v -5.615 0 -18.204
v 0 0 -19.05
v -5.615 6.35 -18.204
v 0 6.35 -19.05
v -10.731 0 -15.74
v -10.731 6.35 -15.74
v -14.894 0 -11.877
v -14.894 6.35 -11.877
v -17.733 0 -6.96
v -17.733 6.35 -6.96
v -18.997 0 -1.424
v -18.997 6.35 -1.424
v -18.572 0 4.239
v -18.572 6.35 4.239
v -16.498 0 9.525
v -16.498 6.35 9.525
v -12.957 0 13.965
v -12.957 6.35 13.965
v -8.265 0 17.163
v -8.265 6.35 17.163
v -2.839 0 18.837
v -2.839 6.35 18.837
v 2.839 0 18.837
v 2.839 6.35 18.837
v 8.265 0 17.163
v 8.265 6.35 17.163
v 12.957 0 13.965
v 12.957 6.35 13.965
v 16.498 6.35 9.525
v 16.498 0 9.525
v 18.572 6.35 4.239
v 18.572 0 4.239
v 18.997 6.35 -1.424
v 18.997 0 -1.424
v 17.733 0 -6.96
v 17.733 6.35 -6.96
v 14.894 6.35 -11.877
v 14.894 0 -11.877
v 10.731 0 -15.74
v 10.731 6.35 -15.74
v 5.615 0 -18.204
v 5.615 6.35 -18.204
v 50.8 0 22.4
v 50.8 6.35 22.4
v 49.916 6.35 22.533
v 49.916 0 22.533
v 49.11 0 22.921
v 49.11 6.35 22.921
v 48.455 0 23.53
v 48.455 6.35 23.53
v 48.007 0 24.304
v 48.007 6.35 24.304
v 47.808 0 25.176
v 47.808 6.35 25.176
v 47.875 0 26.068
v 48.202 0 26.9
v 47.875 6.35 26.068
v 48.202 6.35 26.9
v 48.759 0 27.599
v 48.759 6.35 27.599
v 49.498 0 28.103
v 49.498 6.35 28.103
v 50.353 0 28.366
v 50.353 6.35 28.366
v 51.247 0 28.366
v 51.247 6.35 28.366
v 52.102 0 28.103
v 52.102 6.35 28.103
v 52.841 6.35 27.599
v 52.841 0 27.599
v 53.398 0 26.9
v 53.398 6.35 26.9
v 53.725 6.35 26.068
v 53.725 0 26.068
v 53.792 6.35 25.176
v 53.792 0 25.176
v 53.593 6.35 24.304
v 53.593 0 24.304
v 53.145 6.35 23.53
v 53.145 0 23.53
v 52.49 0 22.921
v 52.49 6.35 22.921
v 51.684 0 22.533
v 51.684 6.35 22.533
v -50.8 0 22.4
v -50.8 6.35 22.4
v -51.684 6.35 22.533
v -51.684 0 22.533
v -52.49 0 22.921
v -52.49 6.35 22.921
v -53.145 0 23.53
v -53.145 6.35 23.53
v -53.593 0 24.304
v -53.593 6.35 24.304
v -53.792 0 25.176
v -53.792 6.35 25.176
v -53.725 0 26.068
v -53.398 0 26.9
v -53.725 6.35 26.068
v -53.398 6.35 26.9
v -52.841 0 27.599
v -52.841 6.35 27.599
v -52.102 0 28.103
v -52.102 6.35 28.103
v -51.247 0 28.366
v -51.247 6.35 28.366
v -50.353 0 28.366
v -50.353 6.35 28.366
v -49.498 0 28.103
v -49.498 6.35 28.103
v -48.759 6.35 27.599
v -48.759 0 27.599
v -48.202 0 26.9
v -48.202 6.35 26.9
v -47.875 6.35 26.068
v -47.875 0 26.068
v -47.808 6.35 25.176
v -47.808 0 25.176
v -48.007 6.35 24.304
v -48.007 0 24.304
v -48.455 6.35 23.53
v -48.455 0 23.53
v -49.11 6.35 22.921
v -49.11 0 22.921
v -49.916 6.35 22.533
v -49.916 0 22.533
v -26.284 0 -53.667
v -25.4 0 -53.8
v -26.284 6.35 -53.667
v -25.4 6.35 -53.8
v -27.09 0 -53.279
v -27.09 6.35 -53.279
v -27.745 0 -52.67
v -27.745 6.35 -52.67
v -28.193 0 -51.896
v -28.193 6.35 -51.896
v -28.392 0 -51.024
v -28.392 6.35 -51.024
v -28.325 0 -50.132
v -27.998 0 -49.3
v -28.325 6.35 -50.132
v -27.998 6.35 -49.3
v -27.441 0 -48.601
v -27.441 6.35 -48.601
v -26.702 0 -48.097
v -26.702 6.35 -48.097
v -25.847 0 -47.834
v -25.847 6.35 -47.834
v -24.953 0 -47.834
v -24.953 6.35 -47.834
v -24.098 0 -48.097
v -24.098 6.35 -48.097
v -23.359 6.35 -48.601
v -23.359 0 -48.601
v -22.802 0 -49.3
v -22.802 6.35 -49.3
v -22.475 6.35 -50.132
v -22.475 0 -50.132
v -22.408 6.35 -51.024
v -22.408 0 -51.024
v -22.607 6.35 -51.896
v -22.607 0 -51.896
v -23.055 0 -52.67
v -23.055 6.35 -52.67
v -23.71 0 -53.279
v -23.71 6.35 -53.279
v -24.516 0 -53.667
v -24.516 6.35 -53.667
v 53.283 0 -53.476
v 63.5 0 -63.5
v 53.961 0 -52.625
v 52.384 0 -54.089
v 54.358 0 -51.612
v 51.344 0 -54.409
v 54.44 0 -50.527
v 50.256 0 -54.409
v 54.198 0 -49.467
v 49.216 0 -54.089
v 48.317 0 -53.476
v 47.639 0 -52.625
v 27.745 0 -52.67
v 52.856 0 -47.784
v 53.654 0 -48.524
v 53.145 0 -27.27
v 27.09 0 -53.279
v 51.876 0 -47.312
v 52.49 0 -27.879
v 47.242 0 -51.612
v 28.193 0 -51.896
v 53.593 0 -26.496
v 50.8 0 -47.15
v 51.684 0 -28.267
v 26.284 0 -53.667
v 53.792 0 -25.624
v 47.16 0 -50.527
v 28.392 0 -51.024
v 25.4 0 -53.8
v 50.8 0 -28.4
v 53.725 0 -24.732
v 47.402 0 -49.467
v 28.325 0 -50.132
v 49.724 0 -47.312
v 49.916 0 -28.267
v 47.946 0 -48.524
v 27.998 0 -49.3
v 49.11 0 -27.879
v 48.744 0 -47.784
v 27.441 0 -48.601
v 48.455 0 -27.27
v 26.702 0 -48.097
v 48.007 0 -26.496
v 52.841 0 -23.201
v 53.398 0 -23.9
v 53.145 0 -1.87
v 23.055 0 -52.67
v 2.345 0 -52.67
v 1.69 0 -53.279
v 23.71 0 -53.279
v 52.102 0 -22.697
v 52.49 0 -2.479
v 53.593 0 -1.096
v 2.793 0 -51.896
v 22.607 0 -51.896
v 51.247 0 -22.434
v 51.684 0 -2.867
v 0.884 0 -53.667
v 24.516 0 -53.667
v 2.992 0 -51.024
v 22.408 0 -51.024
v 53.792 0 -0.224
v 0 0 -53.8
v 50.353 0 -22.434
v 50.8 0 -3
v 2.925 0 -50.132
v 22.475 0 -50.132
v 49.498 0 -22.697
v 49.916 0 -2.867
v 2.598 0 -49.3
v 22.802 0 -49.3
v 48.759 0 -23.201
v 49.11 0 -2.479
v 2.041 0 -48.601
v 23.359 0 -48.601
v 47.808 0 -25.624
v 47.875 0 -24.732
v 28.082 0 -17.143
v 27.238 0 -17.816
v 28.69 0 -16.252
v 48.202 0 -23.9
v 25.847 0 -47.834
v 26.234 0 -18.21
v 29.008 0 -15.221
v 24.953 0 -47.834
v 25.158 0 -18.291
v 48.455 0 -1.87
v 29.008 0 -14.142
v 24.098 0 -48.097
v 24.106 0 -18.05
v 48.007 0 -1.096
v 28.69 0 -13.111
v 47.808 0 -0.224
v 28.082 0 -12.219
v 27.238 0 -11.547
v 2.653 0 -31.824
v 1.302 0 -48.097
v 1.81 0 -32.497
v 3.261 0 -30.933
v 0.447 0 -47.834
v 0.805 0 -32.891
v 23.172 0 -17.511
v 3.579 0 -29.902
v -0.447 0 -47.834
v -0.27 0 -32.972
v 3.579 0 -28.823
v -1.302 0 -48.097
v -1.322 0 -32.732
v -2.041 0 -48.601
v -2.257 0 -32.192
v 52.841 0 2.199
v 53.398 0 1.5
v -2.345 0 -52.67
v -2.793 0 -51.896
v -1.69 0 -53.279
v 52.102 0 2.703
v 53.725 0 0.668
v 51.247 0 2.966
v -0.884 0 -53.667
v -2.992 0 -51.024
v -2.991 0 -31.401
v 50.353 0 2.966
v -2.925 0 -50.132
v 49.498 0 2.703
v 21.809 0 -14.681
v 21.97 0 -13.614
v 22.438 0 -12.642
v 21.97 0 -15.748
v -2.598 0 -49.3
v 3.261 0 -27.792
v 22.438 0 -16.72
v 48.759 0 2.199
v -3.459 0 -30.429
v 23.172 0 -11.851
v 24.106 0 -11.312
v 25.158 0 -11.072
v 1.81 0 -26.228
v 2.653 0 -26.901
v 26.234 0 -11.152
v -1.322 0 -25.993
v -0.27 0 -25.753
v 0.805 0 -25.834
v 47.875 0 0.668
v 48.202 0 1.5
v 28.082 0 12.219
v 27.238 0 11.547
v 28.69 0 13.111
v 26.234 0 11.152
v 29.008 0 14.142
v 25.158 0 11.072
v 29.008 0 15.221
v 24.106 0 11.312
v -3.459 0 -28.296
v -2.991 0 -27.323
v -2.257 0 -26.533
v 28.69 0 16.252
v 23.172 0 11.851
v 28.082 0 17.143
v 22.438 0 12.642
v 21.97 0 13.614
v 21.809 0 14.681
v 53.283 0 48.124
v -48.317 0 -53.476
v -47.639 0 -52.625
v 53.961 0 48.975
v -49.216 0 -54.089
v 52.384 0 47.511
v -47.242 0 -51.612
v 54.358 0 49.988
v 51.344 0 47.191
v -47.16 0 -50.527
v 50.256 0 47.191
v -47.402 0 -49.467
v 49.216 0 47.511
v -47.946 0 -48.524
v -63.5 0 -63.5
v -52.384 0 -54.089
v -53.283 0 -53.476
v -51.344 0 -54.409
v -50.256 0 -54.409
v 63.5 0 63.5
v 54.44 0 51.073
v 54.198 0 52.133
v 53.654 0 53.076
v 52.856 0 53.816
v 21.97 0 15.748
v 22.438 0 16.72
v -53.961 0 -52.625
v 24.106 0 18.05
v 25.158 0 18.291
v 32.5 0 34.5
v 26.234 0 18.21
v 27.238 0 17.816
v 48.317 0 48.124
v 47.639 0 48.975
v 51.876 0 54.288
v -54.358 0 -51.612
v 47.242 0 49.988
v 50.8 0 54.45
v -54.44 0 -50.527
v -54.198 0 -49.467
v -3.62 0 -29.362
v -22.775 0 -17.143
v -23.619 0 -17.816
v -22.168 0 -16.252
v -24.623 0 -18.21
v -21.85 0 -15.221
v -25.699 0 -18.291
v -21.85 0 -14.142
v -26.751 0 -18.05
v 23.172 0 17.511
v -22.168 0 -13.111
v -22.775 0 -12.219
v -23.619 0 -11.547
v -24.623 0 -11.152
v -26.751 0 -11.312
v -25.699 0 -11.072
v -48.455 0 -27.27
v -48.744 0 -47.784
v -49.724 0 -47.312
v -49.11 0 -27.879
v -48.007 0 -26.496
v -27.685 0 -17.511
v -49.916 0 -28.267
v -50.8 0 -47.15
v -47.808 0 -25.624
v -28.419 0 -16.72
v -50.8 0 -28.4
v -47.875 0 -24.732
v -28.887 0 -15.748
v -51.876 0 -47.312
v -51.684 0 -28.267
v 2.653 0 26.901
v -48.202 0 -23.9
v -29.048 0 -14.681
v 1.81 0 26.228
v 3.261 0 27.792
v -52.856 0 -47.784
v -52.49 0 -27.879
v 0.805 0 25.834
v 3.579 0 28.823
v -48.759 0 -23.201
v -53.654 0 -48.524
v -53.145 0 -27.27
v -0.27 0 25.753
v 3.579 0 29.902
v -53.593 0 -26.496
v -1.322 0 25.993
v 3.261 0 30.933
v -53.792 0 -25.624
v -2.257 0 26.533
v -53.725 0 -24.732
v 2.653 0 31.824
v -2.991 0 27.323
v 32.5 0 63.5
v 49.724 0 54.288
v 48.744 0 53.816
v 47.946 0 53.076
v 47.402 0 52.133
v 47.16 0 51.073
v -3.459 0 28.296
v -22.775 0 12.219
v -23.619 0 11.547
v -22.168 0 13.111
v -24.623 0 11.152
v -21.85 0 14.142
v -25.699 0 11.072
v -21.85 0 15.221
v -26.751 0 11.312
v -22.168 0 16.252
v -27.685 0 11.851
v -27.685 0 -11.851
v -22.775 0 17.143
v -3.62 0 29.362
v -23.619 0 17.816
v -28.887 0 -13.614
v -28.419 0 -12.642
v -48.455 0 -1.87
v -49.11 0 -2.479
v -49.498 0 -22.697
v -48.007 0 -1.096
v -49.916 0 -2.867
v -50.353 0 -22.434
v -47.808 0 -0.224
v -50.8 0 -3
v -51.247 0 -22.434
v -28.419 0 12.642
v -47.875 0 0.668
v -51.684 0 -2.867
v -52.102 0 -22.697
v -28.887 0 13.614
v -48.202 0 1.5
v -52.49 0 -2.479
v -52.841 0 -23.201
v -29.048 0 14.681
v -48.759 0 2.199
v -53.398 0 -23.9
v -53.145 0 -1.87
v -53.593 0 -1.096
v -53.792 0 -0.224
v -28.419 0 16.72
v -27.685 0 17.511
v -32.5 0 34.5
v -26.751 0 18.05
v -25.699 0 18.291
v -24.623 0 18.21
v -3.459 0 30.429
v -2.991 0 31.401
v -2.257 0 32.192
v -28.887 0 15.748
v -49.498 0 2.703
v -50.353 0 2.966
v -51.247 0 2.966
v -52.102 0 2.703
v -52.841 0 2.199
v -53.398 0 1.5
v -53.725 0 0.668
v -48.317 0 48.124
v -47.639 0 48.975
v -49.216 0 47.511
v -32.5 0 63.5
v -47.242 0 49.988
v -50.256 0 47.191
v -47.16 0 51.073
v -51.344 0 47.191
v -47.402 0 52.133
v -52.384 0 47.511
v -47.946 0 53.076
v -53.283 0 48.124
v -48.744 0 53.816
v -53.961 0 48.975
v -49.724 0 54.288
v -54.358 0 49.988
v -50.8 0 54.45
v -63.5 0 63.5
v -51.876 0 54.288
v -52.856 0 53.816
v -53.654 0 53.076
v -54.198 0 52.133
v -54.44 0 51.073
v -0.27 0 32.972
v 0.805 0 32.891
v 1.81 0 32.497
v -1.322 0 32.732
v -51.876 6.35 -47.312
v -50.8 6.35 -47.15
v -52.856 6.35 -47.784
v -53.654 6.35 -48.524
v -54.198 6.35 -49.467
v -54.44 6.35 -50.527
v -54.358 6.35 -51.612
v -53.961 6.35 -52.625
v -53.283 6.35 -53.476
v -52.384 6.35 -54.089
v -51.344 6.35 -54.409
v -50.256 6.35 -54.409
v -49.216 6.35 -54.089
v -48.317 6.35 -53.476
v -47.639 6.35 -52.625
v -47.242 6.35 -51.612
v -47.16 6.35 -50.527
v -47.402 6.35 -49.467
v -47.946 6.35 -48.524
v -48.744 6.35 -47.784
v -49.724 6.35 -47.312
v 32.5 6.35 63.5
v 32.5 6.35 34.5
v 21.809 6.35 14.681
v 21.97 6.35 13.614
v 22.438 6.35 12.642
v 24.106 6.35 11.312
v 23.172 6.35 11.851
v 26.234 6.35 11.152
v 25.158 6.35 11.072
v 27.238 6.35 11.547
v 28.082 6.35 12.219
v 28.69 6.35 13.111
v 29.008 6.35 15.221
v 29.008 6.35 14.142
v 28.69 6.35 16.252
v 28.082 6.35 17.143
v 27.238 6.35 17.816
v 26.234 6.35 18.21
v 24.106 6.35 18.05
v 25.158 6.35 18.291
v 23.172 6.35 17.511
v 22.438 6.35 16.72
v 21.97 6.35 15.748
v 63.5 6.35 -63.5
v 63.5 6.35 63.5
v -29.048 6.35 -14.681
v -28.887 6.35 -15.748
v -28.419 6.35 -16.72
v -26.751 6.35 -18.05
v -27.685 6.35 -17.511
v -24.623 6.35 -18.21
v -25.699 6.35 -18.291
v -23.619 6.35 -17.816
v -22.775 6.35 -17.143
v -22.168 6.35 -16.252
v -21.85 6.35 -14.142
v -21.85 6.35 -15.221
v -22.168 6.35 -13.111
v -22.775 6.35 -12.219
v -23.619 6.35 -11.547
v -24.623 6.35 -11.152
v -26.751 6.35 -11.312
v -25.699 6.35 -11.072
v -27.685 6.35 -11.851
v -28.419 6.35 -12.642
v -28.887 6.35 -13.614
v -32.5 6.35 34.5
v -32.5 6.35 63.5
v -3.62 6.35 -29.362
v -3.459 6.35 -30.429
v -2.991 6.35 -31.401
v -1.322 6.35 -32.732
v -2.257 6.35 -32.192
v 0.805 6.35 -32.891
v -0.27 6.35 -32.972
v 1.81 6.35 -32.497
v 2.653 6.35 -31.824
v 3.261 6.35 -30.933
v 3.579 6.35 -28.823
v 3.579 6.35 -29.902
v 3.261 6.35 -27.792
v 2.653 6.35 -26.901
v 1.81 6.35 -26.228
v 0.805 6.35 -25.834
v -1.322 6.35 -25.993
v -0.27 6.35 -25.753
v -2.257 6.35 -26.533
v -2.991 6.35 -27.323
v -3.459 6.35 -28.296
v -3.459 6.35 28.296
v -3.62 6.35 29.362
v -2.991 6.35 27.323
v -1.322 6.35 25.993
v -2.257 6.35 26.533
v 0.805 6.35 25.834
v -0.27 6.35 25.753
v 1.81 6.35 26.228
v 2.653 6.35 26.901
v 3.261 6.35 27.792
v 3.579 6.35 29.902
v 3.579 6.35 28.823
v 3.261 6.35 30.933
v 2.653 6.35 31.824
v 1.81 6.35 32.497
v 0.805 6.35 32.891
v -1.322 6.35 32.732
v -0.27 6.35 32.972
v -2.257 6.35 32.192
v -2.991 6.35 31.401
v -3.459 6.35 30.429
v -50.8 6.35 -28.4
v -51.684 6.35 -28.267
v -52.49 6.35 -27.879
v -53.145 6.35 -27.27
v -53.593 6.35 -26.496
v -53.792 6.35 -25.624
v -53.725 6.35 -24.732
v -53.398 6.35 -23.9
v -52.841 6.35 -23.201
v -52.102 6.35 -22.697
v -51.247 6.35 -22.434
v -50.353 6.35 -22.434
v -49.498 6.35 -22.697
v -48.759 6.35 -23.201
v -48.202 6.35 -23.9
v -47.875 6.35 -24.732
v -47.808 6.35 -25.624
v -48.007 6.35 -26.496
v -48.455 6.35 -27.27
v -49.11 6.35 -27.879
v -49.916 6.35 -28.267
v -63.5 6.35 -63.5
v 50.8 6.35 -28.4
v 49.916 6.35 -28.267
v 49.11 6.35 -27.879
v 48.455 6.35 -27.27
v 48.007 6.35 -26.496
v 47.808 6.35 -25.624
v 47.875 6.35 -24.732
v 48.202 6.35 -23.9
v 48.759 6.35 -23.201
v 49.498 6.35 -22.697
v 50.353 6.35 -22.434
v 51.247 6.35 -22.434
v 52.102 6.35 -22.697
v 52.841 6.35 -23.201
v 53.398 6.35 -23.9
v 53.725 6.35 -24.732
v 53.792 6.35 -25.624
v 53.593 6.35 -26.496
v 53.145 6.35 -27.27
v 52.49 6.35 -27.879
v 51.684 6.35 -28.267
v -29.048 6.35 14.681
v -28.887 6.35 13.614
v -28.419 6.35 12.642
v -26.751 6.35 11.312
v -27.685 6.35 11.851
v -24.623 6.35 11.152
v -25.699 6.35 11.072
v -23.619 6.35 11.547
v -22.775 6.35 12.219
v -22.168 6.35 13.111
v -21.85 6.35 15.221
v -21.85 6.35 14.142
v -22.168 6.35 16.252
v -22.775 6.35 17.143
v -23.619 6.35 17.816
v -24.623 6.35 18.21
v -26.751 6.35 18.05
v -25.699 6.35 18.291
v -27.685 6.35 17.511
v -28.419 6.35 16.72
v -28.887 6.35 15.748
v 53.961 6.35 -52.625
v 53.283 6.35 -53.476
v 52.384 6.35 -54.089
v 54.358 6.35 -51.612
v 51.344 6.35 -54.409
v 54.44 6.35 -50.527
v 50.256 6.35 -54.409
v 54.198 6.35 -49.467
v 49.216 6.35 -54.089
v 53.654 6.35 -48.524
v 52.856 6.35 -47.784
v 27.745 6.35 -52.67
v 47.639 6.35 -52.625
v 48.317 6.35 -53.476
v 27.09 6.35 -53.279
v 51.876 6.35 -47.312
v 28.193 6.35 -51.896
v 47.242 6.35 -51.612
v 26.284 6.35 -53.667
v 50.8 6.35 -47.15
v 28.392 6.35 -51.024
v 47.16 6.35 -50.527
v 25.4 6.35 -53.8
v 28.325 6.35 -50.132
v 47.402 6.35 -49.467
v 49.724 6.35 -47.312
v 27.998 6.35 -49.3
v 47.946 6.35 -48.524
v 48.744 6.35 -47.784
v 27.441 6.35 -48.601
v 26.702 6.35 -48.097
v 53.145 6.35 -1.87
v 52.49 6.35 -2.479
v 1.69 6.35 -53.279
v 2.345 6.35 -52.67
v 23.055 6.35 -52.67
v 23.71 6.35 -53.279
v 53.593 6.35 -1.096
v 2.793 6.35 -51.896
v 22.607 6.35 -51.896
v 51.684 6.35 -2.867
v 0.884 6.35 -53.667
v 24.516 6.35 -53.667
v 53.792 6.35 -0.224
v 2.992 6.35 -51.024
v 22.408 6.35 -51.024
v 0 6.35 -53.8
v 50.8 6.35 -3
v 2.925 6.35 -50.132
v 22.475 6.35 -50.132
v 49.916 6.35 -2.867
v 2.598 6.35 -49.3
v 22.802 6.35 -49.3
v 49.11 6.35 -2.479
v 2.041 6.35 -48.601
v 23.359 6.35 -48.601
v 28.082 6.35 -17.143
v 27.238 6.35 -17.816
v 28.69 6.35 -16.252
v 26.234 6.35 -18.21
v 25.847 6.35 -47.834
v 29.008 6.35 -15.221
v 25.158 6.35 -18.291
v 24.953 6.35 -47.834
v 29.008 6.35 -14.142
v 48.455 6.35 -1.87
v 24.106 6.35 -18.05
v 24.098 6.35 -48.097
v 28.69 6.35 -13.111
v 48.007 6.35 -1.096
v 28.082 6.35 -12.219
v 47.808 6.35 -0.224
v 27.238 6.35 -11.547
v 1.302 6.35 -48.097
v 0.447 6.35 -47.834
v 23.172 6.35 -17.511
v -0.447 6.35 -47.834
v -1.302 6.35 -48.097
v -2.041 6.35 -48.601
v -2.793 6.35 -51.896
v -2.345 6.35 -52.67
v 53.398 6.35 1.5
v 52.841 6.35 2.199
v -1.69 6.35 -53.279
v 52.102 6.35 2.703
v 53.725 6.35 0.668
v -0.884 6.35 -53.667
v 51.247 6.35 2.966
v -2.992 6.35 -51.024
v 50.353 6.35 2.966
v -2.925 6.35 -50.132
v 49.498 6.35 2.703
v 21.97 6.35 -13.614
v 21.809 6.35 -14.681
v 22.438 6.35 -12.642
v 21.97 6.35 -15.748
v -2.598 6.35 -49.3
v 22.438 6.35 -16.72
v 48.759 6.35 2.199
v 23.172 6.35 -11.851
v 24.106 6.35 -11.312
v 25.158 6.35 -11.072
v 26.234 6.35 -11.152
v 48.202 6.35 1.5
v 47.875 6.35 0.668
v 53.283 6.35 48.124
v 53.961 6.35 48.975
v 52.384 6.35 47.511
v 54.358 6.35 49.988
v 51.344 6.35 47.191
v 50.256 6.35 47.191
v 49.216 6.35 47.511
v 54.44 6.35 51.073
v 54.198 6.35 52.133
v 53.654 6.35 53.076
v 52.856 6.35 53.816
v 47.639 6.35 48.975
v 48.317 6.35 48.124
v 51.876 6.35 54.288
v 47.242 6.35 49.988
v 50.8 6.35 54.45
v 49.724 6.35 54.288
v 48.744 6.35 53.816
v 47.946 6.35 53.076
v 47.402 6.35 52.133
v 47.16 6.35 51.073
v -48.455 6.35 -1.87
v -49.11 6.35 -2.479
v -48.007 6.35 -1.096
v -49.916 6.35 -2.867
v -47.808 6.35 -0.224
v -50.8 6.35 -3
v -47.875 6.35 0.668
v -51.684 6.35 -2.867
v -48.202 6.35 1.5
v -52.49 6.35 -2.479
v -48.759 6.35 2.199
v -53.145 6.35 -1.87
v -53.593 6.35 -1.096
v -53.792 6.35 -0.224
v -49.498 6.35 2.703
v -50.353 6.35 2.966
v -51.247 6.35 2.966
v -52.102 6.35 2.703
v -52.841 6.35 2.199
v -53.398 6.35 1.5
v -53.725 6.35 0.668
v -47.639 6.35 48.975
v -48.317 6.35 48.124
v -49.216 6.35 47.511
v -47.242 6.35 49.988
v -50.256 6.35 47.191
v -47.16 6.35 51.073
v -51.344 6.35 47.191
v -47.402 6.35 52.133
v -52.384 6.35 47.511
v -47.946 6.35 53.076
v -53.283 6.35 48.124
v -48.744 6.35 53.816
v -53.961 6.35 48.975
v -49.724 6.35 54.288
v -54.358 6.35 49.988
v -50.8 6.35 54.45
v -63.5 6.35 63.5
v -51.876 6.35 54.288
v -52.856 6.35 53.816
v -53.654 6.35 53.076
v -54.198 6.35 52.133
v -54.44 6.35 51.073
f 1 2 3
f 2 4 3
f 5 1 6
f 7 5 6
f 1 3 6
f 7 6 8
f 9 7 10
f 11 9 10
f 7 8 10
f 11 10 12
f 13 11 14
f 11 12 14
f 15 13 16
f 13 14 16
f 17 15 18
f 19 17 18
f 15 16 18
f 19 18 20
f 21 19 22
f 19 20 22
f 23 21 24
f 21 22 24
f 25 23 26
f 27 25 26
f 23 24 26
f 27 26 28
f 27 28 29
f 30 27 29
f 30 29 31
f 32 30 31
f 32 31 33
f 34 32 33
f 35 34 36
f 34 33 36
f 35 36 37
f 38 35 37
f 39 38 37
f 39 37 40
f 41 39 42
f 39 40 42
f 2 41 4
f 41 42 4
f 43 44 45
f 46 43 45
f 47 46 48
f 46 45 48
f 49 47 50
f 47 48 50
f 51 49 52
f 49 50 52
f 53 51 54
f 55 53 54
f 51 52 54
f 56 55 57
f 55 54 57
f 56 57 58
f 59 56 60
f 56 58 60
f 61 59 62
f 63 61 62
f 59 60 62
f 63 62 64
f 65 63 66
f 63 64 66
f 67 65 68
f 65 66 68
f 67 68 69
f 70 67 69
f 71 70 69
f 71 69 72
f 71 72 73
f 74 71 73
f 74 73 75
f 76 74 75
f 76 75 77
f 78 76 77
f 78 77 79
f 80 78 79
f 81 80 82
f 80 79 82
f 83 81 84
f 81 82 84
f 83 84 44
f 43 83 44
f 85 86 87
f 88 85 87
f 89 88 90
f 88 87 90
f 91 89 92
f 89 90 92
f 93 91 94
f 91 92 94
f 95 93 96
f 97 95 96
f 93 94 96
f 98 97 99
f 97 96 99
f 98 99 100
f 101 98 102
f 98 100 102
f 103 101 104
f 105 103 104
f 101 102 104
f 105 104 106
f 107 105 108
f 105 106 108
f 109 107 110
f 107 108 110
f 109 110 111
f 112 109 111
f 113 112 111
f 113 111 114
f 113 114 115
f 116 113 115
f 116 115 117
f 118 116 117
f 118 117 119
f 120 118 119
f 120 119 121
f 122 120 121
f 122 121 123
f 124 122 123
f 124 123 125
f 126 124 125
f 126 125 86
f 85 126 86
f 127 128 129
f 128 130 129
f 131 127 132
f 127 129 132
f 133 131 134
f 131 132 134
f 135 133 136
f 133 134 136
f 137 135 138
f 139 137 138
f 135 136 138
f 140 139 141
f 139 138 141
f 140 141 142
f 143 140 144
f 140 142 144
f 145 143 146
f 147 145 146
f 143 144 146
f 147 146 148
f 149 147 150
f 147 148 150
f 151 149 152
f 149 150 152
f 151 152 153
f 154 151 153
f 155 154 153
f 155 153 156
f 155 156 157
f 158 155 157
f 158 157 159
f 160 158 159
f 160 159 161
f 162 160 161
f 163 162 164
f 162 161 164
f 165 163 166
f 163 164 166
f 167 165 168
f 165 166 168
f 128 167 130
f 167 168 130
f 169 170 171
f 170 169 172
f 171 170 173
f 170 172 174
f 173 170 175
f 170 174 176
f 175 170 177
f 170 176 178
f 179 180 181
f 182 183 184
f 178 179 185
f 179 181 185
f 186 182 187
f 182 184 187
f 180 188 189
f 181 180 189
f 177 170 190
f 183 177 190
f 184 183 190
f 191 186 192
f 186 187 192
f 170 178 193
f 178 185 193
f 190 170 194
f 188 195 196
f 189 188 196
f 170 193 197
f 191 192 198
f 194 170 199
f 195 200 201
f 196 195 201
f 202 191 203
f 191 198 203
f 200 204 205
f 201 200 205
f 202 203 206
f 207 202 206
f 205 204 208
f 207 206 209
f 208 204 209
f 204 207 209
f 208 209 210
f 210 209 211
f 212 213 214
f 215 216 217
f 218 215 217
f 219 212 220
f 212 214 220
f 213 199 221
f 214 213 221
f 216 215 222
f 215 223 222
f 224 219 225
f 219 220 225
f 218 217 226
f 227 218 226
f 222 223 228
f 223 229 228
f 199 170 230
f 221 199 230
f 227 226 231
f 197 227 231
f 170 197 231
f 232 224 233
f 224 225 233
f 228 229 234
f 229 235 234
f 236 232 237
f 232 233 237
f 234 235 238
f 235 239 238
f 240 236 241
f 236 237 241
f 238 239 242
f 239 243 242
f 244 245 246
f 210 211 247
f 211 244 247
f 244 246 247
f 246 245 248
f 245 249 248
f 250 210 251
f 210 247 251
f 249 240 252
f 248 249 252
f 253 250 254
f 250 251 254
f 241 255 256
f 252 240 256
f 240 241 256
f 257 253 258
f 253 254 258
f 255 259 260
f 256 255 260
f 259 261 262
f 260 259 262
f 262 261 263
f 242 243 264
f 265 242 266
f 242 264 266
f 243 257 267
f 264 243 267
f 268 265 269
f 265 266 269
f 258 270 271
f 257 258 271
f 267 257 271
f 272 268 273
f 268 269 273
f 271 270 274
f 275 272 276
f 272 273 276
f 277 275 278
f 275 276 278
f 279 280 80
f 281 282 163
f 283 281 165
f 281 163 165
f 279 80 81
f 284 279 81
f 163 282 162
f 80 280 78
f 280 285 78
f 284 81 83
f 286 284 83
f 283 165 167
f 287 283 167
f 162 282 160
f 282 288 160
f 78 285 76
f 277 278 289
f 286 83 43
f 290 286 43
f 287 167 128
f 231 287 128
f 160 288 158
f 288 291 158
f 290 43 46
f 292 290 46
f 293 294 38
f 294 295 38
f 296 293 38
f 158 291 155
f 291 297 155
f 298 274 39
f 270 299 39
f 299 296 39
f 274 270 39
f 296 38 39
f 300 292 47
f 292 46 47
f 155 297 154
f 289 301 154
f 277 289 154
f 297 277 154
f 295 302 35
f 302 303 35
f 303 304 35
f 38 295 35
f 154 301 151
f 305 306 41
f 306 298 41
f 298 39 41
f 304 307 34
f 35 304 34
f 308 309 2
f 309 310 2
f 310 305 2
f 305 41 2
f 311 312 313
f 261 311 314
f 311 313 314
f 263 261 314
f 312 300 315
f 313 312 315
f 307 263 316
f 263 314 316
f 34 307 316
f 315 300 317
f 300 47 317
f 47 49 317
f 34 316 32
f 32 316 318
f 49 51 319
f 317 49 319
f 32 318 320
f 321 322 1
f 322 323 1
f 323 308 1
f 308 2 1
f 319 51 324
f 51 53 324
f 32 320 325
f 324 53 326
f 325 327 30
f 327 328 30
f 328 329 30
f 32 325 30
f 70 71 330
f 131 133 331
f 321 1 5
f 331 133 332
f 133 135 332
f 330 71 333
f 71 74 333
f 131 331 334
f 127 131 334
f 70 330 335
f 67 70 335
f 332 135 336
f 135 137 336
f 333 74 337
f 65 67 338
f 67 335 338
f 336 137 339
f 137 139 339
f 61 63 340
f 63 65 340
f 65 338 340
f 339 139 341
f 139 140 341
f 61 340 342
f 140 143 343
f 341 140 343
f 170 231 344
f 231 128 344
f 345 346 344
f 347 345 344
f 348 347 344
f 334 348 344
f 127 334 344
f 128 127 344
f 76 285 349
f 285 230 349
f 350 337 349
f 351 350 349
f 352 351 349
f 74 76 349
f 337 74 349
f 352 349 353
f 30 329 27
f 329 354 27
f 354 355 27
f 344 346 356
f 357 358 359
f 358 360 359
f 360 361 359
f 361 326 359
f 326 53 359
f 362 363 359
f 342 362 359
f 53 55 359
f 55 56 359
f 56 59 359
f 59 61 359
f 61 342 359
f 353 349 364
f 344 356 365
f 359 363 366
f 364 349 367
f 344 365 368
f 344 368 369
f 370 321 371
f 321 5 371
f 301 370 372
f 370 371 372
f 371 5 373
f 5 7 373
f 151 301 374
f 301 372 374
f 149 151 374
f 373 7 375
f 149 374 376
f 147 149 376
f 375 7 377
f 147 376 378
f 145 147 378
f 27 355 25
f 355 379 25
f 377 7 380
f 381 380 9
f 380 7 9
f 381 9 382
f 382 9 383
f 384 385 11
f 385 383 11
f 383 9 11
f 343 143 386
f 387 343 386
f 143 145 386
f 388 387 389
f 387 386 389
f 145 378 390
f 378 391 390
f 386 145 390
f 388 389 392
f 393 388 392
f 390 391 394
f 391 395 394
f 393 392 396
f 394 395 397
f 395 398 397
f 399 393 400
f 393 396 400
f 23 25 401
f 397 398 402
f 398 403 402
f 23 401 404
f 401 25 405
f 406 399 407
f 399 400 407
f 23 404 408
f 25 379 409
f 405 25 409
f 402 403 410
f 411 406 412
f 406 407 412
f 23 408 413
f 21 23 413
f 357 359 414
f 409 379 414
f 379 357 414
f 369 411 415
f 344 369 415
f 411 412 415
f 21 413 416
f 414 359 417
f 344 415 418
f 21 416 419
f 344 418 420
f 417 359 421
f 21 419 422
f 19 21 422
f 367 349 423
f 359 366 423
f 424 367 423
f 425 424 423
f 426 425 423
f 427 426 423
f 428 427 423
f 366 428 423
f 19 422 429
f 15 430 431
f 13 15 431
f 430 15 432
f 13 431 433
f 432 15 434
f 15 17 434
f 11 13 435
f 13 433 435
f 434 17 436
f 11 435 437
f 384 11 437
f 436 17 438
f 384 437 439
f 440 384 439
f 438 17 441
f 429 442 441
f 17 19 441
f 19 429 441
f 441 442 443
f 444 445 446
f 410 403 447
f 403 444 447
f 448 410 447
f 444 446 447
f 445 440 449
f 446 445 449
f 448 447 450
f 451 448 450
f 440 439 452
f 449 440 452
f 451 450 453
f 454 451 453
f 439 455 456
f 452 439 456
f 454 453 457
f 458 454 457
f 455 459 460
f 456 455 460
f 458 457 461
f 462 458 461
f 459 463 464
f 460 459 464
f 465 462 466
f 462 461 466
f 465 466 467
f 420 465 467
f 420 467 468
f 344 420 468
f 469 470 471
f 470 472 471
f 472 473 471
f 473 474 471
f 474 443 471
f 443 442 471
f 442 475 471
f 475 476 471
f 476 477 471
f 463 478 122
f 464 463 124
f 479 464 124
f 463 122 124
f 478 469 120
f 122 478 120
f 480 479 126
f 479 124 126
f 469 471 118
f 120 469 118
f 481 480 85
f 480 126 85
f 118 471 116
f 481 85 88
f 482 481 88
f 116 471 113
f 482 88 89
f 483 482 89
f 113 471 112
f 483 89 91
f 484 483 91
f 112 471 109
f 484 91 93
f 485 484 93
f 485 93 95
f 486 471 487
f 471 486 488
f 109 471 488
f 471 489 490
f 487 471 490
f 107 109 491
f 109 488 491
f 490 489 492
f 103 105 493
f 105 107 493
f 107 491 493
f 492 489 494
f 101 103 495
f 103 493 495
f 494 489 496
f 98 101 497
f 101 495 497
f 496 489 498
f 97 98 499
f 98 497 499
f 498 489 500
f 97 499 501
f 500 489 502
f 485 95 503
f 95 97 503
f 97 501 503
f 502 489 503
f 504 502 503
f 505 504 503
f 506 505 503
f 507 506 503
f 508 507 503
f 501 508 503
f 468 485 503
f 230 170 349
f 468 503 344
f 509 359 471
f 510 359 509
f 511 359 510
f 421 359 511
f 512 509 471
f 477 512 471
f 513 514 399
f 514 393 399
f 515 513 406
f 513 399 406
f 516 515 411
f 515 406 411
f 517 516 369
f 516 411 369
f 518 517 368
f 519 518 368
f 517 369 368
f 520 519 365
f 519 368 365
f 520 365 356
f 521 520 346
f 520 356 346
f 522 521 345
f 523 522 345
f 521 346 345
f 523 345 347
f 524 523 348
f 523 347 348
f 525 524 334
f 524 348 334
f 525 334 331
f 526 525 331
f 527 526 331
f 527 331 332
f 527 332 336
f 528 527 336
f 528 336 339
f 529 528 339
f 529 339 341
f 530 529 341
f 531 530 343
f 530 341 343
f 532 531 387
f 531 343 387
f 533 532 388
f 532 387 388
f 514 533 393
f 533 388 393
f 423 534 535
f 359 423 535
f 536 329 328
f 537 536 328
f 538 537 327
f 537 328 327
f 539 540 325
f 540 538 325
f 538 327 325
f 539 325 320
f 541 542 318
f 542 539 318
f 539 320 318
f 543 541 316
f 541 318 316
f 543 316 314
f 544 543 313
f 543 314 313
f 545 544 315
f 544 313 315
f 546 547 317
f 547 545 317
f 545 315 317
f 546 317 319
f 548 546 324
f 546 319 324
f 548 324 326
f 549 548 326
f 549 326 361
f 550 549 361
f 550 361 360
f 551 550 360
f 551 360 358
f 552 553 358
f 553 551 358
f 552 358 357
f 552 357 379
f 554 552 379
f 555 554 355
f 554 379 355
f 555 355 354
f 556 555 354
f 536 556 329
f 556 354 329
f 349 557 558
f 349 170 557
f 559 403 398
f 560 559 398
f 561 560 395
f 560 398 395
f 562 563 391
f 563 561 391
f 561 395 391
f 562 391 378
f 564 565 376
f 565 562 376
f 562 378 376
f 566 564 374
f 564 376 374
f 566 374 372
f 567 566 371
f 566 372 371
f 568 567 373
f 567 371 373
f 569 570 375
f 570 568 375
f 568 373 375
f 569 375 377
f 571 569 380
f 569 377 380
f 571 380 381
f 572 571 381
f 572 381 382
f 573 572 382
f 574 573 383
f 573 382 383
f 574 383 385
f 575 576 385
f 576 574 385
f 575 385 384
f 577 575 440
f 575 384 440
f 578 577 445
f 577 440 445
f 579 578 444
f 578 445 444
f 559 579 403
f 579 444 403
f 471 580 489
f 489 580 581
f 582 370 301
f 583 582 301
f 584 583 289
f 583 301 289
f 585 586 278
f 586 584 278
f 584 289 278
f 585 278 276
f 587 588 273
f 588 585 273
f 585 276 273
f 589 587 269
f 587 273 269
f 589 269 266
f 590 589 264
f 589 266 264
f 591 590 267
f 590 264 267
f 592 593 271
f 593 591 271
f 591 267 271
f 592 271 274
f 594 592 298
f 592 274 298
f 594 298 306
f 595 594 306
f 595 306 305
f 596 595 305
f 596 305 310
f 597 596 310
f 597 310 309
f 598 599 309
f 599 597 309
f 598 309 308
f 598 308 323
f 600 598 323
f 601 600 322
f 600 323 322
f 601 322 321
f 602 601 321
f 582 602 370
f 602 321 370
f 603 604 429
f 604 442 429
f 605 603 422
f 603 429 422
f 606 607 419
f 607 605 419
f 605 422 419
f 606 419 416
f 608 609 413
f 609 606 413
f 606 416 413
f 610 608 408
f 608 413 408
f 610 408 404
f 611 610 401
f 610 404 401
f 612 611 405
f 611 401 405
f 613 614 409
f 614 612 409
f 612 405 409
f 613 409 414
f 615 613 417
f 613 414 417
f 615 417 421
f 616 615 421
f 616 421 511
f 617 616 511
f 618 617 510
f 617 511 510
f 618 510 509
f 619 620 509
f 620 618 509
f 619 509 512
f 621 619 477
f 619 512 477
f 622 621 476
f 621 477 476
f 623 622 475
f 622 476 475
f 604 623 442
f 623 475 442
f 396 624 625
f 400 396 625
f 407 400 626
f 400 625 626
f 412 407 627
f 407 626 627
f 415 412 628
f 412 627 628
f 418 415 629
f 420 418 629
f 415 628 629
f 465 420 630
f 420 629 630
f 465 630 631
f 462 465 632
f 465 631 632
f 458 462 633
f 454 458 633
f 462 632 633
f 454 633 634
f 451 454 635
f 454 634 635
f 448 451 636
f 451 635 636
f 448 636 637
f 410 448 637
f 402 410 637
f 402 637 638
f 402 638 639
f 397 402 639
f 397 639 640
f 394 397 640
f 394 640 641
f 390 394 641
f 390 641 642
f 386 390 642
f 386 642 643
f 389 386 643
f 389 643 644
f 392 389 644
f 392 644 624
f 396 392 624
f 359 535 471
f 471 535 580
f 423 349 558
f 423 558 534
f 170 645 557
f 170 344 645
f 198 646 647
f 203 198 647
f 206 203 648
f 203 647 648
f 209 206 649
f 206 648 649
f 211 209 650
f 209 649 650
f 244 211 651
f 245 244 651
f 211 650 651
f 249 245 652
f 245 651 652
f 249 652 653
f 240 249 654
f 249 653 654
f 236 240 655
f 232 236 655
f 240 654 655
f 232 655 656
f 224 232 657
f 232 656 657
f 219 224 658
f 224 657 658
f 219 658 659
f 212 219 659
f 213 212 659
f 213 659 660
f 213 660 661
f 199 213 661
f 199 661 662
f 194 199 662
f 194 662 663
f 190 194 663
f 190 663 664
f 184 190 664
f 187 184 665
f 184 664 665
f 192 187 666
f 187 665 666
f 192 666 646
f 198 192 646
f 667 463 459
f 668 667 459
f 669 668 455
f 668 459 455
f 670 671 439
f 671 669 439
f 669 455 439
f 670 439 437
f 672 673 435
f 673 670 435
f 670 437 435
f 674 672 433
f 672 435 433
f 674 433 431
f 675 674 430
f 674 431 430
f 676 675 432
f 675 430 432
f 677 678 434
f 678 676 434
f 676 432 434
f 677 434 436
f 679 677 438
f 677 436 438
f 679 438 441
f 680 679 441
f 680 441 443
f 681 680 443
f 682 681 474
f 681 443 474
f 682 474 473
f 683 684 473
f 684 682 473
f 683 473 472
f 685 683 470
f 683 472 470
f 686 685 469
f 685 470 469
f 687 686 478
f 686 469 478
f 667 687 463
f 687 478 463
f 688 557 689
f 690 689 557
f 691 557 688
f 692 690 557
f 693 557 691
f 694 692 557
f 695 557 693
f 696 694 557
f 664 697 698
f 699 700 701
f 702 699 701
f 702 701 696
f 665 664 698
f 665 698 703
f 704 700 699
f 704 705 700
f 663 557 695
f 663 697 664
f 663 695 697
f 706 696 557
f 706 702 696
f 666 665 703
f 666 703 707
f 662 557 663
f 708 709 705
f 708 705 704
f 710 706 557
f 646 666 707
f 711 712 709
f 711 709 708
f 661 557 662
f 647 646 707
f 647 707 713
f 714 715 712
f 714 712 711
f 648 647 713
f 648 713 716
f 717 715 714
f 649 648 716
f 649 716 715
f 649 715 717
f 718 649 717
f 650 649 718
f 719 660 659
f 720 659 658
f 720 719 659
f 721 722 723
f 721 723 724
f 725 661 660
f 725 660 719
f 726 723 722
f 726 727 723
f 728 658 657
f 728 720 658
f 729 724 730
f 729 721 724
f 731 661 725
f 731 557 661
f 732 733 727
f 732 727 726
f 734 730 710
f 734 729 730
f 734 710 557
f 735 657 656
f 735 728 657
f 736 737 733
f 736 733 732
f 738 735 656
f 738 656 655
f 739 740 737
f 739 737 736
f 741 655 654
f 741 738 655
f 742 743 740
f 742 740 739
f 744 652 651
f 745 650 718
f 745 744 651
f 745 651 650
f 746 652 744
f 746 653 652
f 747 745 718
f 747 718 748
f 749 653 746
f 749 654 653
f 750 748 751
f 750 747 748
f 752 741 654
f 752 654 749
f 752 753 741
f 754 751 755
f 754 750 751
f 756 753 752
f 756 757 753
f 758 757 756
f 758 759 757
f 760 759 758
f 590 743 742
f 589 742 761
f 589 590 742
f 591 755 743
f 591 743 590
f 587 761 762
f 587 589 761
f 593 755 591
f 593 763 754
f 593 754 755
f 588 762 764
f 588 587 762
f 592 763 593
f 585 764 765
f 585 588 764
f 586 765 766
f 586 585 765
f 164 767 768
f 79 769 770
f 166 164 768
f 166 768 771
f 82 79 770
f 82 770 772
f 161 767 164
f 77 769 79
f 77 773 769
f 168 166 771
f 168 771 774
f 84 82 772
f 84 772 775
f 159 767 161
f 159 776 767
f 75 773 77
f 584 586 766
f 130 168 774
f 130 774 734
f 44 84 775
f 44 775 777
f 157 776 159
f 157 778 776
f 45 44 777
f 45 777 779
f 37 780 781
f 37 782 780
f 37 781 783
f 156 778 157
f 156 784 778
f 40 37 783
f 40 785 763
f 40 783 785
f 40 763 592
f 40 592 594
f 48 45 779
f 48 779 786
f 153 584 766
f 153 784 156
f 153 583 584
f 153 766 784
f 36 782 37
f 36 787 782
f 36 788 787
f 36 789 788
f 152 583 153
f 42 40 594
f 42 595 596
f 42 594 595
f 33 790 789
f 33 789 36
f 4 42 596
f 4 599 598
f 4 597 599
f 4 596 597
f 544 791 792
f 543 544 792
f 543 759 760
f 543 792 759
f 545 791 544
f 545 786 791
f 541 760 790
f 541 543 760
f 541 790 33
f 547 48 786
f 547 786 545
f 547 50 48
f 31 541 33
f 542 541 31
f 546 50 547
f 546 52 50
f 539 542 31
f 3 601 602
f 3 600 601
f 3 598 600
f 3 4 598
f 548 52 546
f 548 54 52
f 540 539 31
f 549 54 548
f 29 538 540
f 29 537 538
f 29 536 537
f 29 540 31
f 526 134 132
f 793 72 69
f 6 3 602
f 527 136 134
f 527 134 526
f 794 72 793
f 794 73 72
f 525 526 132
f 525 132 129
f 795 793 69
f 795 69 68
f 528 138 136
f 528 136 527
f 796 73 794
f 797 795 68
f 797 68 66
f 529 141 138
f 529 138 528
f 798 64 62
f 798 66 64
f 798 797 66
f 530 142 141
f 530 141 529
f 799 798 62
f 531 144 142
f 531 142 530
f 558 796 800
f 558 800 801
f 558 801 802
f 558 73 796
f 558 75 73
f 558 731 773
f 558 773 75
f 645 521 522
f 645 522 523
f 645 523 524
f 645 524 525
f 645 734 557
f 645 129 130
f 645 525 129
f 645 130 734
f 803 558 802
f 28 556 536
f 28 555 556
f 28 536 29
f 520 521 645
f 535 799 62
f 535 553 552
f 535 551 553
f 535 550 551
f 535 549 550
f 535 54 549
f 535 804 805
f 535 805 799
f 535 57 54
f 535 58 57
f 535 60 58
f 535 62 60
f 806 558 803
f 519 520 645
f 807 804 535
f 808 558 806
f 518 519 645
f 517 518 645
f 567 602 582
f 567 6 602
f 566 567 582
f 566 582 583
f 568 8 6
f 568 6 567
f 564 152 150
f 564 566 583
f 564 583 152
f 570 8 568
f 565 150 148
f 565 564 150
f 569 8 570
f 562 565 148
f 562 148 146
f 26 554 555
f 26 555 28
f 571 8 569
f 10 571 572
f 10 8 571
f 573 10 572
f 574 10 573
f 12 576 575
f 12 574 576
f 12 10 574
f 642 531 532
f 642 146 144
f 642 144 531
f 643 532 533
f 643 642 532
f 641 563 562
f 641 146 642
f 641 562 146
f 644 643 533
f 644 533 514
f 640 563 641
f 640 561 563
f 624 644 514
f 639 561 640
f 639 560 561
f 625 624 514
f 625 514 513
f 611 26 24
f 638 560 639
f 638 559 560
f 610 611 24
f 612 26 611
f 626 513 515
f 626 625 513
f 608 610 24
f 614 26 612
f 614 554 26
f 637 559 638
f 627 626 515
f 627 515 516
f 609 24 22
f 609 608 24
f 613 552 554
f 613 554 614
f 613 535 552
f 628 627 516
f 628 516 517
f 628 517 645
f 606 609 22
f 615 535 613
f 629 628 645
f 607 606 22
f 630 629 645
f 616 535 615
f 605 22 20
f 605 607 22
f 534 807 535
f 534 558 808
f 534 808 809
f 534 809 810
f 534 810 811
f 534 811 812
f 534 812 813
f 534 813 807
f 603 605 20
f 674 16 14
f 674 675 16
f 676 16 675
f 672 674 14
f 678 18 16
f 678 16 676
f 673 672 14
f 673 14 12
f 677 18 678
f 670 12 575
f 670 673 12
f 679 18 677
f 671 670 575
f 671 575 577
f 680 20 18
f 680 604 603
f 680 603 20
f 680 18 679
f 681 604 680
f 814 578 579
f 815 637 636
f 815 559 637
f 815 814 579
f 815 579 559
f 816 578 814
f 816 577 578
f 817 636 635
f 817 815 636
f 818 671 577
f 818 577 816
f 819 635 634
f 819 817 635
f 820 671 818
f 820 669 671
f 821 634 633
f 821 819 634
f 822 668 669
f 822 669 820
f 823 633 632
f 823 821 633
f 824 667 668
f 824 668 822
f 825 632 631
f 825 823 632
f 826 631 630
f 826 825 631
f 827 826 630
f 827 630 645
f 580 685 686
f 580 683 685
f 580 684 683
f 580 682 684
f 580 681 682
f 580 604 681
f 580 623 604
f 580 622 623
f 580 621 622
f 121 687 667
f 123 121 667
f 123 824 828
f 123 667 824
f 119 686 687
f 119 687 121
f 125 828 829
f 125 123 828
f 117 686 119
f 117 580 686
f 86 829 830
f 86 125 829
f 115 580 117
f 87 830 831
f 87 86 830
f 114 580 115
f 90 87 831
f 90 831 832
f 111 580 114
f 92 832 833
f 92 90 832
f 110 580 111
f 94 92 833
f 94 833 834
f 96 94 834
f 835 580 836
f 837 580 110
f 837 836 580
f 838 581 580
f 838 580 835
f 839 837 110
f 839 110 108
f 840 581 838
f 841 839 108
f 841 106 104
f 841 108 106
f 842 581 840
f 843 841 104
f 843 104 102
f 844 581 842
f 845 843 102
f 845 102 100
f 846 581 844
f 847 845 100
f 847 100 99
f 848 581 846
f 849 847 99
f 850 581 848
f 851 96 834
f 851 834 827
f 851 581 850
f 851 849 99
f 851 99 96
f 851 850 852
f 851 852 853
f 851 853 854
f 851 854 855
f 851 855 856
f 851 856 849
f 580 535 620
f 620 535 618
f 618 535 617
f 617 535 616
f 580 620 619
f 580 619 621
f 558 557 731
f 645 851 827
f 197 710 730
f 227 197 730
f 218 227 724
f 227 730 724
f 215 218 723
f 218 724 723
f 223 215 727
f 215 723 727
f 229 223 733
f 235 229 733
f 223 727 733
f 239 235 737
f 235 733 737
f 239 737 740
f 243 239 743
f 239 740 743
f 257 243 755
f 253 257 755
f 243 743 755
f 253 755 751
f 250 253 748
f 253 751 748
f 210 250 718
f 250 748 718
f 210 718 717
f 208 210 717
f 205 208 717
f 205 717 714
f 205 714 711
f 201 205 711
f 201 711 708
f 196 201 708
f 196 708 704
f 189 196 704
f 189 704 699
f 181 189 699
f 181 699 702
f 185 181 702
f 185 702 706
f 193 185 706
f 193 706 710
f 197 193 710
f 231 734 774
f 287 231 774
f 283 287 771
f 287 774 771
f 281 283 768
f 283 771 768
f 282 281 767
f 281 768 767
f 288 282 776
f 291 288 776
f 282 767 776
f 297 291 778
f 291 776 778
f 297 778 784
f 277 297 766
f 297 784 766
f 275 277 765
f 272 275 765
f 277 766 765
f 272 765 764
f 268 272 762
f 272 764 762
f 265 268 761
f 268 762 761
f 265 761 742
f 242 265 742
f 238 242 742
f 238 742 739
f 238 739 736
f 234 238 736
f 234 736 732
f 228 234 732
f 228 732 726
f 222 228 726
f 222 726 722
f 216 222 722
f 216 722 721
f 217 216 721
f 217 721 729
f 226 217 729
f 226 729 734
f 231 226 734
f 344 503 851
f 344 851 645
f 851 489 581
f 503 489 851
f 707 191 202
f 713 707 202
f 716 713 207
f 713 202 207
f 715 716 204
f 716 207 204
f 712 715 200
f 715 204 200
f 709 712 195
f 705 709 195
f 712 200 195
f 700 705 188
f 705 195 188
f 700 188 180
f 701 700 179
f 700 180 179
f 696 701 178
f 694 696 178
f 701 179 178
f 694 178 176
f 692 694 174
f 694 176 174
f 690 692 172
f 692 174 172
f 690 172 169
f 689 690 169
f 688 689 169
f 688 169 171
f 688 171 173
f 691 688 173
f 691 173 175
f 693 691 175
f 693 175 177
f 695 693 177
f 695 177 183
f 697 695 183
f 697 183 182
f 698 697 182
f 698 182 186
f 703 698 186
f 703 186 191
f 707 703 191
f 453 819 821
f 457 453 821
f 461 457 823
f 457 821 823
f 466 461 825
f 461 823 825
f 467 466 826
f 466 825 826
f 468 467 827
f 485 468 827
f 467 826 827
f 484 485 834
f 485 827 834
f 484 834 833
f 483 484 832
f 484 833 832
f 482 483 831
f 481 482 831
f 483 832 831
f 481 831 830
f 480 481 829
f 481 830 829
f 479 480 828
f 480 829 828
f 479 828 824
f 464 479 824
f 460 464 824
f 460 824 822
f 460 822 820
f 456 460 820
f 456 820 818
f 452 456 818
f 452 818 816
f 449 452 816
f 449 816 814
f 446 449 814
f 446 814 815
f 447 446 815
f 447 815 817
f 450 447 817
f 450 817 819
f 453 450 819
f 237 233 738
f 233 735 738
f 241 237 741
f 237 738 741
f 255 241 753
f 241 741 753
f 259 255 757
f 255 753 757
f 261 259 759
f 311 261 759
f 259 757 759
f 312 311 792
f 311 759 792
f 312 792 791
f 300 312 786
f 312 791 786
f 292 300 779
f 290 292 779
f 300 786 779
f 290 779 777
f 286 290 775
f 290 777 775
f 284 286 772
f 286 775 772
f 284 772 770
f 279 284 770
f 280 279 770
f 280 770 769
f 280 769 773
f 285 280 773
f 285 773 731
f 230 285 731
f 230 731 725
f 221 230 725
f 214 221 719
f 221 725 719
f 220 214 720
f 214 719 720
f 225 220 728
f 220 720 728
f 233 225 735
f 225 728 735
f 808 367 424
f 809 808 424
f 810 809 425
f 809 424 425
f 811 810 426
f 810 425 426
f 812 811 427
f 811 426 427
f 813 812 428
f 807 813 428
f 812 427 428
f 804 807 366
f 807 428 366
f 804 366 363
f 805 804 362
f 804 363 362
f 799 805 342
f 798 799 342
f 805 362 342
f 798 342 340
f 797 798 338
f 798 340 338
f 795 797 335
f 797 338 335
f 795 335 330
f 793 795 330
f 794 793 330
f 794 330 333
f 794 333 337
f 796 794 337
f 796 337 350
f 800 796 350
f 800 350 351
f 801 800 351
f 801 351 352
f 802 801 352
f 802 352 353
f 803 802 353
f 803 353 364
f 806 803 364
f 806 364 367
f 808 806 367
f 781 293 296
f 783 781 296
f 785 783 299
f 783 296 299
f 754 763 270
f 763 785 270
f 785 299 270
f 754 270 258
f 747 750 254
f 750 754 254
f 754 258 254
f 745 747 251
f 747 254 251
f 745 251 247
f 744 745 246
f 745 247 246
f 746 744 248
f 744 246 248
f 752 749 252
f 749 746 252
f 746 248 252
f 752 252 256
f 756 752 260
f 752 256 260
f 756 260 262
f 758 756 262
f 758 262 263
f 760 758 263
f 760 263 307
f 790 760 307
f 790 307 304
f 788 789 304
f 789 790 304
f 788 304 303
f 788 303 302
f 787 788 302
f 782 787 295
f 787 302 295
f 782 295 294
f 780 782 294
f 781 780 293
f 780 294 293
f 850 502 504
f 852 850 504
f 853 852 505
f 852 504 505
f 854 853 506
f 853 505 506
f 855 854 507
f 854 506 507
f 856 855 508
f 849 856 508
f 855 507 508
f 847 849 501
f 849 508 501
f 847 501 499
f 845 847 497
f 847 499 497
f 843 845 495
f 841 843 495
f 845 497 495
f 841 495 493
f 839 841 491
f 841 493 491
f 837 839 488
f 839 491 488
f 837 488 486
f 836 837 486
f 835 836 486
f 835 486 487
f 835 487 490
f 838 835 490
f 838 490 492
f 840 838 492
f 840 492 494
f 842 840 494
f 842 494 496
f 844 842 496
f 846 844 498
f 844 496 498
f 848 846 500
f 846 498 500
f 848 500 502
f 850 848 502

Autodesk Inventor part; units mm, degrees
ref_plane "YZ Plane" through (0, 0, 0) normal (1, 0, 0) x (0, 1, 0)
ref_plane "XZ Plane" through (0, 0, 0) normal (0, 1, 0) x (-1, 0, 0)
ref_plane "XY Plane" through (0, 0, 0) normal (0, 0, 1) x (1, 0, 0)
sketch "Sketch3" plane through (0, 0, 0) normal (0, 1, 0) x (-1, 0, 0)
  circle A0 centre (0, 29.3624) radius 3.6195
  circle A1 centre (0, 29.3624) radius 3.6195
  circle A2 centre (25.4286, 14.6812) radius 3.6195
  circle A3 centre (-25.4286, 14.6812) radius 3.6195
  circle A4 centre (-25.4286, -14.6812) radius 3.6195
  circle A5 centre (0, -29.3624) radius 3.6195
  circle A6 centre (25.4286, -14.6812) radius 3.6195
  circle A7 centre (-25.4286, 14.6812) radius 3.6195
  circle A8 centre (-25.4286, -14.6812) radius 3.6195
  circle A9 centre (0, -29.3624) radius 3.6195
  circle A10 centre (25.4286, -14.6812) radius 3.6195
  circle A11 centre (25.4286, 14.6812) radius 3.6195
  line L0 (-63.5, 63.5) -> (63.5, 63.5)
  line L1 (63.5, 63.5) -> (63.5, -63.5)
  line L2 (63.5, -63.5) -> (-63.5, -63.5)
  line L3 (-63.5, -63.5) -> (-63.5, 63.5)
  line L4 (-63.5, 63.5) -> (63.5, -63.5) construction
  line L5 (63.5, 63.5) -> (-63.5, -63.5) construction
  point P0 (0, 0)
  dimension "d104" = 127
  dimension "d105" = 127
extrude "Extrusion1" add sketch "Sketch3" along normal blind 6.35
sketch "Sketch4" plane through (0, 0, 0) normal (0, -1, 0) x (1, 0, 0)
  circle A0 centre (-50.8, -50.8) radius 3
  line L0 (-63.5, -63.5) -> (-63.5, 63.5) projected
  line L1 (63.5, -63.5) -> (-63.5, -63.5) projected
  circle A1 centre (50.8, -50.8) radius 3
  line L2 (63.5, 63.5) -> (63.5, -63.5) projected
  circle A2 centre (50.8, 50.8) radius 3
  line L3 (-63.5, 63.5) -> (63.5, 63.5) projected
  circle A3 centre (-50.8, 50.8) radius 3
  point P0 (0, 0)
  dimension "d106" = 6
  dimension "d107" = 12.7
  dimension "d108" = 12.7
  dimension "d109" = 6
  dimension "d110" = 12.7
  dimension "d111" = 12.7
  dimension "d112" = 6
  dimension "d113" = 12.7
  dimension "d114" = 12.7
  dimension "d115" = 6
  dimension "d116" = 12.7
  dimension "d117" = 12.7
hole "Hole6" at (-50.8, 0, 50.8) direction (0, 1, 0) diameter 6 end through all
hole "Hole7" at (50.8, 0, 50.8) direction (0, 1, 0) diameter 6 end through all
hole "Hole8" at (50.8, 0, -50.8) direction (0, 1, 0) diameter 6 end through all
hole "Hole9" at (-50.8, 0, -50.8) direction (0, 1, 0) diameter 6 end through all
hole "Hole10" at (0, 0, 0) direction (0, 1, 0) diameter 38.1 end through all
pattern_linear "Rectangular Pattern5" count 4 spacing 25.4 along (0, 0, -1) of "Hole6"
pattern_linear "Rectangular Pattern6" count 4 spacing 25.4 along (1, 0, 0) of "Hole6"
pattern_linear "Rectangular Pattern7" count 4 spacing 25.4 along (0, 0, -1) of "Hole7"
pattern_linear "Rectangular Pattern8" count 4 spacing 25.4 along (-1, 0, 0) of "Hole8"
thread "Thread21" size "1/4-20 UNC" class "2B" standard "ANSI Unified Screw Threads" full length
thread "Thread22" size "1/4-20 UNC" class "2B" standard "ANSI Unified Screw Threads" full length
thread "Thread23" size "1/4-20 UNC" class "2B" standard "ANSI Unified Screw Threads" full length
thread "Thread24" size "1/4-20 UNC" class "2B" standard "ANSI Unified Screw Threads" full length
thread "Thread25" size "1/4-20 UNC" class "2B" standard "ANSI Unified Screw Threads" full length
thread "Thread26" size "1/4-20 UNC" class "2B" standard "ANSI Unified Screw Threads" full length
thread "Thread27" size "1/4-20 UNC" class "2B" standard "ANSI Unified Screw Threads" full length
thread "Thread28" size "1/4-20 UNC" class "2B" standard "ANSI Unified Screw Threads" full length
thread "Thread29" size "1/4-20 UNC" class "2B" standard "ANSI Unified Screw Threads" full length
thread "Thread30" size "1/4-20 UNC" class "2B" standard "ANSI Unified Screw Threads" full length
thread "Thread31" size "1/4-20 UNC" class "2B" standard "ANSI Unified Screw Threads" full length
thread "Thread32" size "1/4-20 UNC" class "2B" standard "ANSI Unified Screw Threads" full length
sketch "Sketch6" plane through (0, 6.35, 0) normal (0, 1, 0) x (1, 0, 0)
  line L0 (-32.5, -92.5) -> (32.5, -92.5)
  line L1 (32.5, -92.5) -> (32.5, -34.5)
  line L2 (32.5, -34.5) -> (-32.5, -34.5)
  line L3 (-32.5, -34.5) -> (-32.5, -92.5)
  line L4 (-63.5, -63.5) -> (63.5, -63.5) projected
  line L5 (-32.5, -92.5) -> (32.5, -34.5) construction
  line L6 (32.5, -92.5) -> (-32.5, -34.5) construction
  point P0 (0, 0)
  point P1 (0, -63.5)
  dimension "d189" = 65
  dimension "d232" = 58
extrude "Extrusion2" cut sketch "Sketch6" against normal blind 25.4
sketch "Sketch7" plane through (0, 6.35, 0) normal (0, 1, 0) x (1, 0, 0)
  circle A0 centre (-50.8, -50.8) radius 3
  line L0 (-63.5, -63.5) -> (-63.5, 63.5)
  line L1 (63.5, -63.5) -> (-63.5, -63.5)
  circle A1 centre (50.8, -50.8) radius 3
  line L2 (63.5, 63.5) -> (63.5, -63.5)
  circle A2 centre (50.8, 50.8) radius 3
  line L3 (-63.5, 63.5) -> (63.5, 63.5)
  circle A3 centre (-50.8, 50.8) radius 3
  point P0 (0, 0)
  point P1 (0, 0)
  dimension "d192" = 6
  dimension "d193" = 12.7
  dimension "d194" = 12.7
  dimension "d195" = 6
  dimension "d196" = 12.7
  dimension "d197" = 12.7
  dimension "d198" = 6
  dimension "d199" = 12.7
  dimension "d200" = 12.7
  dimension "d201" = 6
  dimension "d202" = 12.7
  dimension "d203" = 12.7
hole "Hole11" at (-50.8, 6.35, -50.8) direction (0, -1, 0) diameter 7.3 end through all
hole "Hole12" at (50.8, 6.35, -50.8) direction (0, -1, 0) diameter 7.3 end through all
hole "Hole13" at (50.8, 6.35, 50.8) direction (0, -1, 0) diameter 7.3 end through all
hole "Hole14" at (-50.8, 6.35, 50.8) direction (0, -1, 0) diameter 7.3 end through all
properties part number "basenueva(5x5)"
